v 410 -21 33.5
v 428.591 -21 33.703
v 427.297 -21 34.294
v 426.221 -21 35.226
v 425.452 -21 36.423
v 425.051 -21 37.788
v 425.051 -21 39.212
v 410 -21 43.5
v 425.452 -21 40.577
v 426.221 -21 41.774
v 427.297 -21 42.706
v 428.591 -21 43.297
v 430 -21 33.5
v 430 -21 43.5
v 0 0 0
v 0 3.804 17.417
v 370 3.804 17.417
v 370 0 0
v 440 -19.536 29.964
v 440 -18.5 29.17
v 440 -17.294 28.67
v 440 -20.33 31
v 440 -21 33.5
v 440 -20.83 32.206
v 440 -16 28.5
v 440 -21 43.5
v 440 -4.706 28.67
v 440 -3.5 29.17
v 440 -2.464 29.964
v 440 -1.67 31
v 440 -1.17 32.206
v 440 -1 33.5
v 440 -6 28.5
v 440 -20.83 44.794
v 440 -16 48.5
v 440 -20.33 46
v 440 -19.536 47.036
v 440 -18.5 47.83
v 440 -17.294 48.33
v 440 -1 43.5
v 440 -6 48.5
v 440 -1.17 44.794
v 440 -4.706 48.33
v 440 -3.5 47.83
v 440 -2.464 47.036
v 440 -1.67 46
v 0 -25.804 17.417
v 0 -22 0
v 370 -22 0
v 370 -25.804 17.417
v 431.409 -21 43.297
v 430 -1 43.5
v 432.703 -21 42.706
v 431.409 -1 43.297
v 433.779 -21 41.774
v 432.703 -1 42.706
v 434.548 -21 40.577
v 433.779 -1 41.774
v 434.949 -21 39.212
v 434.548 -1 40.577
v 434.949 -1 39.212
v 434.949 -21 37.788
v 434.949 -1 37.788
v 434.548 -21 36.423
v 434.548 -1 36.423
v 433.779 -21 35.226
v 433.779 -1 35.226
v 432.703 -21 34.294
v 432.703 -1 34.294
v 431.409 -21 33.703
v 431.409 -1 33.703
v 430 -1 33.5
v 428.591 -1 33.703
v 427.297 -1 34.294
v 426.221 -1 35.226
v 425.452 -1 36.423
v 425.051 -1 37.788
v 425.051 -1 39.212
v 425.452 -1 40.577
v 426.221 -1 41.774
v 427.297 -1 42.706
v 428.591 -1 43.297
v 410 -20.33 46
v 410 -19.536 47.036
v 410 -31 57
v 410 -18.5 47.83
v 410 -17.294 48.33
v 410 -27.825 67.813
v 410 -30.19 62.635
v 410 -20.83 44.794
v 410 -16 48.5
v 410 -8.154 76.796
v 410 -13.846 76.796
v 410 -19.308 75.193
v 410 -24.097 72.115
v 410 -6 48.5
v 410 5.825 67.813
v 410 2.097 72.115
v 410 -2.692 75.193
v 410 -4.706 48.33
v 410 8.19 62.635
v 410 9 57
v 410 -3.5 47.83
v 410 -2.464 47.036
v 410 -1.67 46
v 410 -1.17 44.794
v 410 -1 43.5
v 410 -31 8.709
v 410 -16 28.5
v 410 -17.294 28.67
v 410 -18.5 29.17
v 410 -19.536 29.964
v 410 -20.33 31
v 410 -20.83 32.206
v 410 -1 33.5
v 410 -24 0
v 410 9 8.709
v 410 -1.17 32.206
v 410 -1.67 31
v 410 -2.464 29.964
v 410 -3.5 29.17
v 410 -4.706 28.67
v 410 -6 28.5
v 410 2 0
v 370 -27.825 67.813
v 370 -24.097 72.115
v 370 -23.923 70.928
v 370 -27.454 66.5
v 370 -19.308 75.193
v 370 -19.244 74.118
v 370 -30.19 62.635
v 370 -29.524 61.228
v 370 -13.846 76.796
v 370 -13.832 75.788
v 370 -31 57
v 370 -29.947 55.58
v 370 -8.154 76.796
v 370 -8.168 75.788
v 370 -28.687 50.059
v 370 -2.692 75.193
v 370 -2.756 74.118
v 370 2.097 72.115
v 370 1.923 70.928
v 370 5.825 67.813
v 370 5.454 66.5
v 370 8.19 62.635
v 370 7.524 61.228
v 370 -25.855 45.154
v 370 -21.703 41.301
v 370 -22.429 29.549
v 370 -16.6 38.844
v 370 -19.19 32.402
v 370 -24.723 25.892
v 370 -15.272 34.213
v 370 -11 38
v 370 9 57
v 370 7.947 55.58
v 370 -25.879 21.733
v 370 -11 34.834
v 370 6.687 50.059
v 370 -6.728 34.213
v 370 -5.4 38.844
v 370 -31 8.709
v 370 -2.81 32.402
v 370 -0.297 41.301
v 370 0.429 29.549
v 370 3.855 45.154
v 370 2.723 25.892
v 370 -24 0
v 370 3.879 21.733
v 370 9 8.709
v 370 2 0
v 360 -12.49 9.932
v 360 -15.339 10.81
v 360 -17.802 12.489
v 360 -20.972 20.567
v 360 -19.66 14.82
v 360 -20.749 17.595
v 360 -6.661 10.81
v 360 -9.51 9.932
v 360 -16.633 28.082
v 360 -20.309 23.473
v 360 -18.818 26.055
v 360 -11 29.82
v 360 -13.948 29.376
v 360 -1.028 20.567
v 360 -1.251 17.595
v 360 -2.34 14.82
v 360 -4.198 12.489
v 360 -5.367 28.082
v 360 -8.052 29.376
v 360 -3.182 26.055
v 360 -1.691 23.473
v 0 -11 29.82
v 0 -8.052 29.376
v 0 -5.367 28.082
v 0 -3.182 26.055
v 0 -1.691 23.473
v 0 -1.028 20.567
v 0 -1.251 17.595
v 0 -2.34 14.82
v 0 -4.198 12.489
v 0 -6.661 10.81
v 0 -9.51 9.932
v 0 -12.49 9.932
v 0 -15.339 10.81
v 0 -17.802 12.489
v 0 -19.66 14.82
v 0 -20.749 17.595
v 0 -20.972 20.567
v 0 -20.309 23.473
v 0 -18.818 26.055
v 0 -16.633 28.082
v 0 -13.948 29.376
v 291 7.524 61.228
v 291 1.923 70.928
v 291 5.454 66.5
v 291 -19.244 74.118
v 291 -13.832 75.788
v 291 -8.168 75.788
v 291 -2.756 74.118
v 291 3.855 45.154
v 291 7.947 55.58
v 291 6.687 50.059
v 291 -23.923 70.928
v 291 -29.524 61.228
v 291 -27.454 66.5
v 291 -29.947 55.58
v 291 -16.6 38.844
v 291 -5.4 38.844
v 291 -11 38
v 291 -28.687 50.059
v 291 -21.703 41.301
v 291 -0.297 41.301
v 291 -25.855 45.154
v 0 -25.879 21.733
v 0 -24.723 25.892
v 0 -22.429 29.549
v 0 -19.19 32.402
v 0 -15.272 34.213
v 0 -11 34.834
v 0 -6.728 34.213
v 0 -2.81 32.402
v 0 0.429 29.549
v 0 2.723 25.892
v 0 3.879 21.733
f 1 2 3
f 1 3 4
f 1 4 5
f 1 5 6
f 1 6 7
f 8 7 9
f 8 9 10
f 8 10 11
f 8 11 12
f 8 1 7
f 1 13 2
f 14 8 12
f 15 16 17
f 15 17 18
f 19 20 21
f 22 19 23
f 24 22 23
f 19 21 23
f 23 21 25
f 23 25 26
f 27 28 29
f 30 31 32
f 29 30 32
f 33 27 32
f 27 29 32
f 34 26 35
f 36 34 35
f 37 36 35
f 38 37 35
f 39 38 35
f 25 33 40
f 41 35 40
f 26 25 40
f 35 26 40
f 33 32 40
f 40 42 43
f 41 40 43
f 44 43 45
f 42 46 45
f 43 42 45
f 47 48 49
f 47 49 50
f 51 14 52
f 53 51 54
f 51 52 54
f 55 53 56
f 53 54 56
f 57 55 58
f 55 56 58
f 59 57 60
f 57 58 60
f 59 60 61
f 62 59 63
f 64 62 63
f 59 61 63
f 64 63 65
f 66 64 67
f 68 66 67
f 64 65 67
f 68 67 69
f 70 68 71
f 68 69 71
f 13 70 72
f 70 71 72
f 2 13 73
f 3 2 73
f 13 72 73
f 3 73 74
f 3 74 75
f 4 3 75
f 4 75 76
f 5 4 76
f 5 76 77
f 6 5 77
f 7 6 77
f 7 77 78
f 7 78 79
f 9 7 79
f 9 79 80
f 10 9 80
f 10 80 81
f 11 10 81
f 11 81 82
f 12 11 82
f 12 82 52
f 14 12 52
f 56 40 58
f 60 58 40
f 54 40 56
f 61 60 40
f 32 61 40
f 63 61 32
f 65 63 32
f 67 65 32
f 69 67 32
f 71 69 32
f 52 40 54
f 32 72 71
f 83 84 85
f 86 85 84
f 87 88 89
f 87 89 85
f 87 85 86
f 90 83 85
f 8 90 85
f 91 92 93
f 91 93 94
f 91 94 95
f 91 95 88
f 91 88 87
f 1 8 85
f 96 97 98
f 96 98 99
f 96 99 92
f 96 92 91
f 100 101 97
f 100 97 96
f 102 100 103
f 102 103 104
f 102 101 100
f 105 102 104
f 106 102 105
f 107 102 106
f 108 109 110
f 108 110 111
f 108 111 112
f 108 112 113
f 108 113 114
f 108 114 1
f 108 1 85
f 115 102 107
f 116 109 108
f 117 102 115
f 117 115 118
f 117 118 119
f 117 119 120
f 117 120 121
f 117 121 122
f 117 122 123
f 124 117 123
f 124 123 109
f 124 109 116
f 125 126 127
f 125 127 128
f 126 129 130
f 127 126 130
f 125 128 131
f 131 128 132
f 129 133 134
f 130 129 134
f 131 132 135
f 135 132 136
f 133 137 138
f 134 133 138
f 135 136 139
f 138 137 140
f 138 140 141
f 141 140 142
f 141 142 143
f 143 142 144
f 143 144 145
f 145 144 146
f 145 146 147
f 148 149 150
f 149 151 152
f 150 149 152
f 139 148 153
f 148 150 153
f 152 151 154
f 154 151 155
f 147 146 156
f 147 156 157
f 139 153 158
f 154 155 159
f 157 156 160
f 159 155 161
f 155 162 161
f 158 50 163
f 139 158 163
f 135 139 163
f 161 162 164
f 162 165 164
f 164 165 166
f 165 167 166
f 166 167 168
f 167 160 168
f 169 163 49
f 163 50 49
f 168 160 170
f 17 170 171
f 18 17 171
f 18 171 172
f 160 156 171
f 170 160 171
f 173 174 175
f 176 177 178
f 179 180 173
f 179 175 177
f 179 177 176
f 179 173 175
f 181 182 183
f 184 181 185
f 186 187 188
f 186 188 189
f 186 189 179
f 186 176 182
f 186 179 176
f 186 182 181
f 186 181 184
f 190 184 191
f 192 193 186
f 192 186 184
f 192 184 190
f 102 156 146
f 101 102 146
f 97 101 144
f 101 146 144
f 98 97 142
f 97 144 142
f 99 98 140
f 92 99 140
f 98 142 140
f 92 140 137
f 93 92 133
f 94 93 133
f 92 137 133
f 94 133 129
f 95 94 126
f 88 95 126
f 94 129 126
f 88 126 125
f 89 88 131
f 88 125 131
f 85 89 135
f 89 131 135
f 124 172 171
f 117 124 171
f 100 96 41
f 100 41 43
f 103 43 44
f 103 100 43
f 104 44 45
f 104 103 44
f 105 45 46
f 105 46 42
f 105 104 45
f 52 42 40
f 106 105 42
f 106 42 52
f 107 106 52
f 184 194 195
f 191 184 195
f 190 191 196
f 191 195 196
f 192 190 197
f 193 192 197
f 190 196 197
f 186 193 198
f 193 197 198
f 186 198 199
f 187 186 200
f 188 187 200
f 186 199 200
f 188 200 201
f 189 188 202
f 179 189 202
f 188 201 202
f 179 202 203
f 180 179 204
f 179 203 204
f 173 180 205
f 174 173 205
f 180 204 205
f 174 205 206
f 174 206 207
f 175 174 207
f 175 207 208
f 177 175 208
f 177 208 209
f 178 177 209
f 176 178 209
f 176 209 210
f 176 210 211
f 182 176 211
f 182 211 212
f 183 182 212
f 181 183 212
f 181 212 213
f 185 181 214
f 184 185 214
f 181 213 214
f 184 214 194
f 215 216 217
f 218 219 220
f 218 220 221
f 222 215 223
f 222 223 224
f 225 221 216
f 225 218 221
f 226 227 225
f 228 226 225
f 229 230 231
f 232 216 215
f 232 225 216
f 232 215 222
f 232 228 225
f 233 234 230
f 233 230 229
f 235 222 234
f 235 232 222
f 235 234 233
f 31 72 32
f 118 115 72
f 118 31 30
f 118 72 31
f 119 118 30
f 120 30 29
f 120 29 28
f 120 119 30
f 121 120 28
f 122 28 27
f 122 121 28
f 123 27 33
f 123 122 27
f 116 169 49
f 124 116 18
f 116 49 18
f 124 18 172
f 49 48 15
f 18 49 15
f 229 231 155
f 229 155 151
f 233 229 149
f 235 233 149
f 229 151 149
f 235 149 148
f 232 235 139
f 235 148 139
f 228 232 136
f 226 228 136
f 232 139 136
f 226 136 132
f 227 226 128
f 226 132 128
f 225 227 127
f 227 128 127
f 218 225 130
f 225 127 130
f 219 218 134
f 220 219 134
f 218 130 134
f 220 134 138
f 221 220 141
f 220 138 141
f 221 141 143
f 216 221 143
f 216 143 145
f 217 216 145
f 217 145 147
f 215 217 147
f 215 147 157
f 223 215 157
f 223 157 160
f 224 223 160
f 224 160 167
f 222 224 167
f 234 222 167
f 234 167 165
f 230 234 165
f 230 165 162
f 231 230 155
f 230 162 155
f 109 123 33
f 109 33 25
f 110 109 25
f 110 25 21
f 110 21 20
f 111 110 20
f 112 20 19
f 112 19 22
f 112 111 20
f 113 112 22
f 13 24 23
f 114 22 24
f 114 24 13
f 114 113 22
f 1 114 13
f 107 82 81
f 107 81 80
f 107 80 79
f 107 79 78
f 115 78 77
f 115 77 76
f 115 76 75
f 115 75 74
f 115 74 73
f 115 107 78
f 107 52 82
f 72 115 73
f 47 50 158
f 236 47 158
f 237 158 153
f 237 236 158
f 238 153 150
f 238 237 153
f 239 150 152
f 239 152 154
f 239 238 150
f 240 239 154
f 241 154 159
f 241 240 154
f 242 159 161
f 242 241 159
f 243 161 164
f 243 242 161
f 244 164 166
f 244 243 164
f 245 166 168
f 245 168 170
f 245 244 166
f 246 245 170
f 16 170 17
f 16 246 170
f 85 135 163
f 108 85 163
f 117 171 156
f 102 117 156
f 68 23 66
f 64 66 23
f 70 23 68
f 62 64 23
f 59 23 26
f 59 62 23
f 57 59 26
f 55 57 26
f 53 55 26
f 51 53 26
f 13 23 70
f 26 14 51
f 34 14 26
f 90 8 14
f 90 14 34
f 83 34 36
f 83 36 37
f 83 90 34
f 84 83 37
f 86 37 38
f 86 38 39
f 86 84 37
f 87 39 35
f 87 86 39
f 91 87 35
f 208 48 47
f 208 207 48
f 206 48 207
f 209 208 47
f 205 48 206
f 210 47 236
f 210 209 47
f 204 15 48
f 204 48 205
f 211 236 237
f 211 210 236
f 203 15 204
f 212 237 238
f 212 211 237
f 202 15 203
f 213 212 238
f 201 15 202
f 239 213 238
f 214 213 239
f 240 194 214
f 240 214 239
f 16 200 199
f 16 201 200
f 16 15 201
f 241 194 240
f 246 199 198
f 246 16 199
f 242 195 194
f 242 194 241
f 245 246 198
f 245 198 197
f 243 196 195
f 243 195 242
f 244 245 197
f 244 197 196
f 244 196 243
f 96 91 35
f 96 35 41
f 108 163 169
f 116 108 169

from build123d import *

# Parameters (mm, degrees)
SALIENTE_EXTRUIR2_DEPTH = 370
CROQUIS3_R              = 10
CORTAR_EXTRUIR1_DEPTH   = 360
SALIENTE_EXTRUIR3_DEPTH = 40
SALIENTE_EXTRUIR4_DEPTH = 30
CORTAR_EXTRUIR2_REACH   = 449.693
CROQUIS6_R              = 5
CROQUIS7_R              = 19
SALIENTE_EXTRUIR5_DEPTH = 79


with BuildPart() as part:
    # Croquis2 → Saliente-Extruir2 (new body)
    with BuildSketch(Plane(origin=(0, 0, 0), x_dir=(0, 0, -1), z_dir=(1, 0, 0))):
        with BuildLine():
            Line((0, 0), (0, -22))
            Line((0, -22), (-17.417233251, -25.803951615))
            ThreePointArc((-17.417233251, -25.803951615), (-34.834466503, -11), (-17.417233251, 3.803951615))
            Line((-17.417233251, 3.803951615), (0, 0))
        make_face()
    extrude(amount=SALIENTE_EXTRUIR2_DEPTH)

    # Croquis3 → Cortar-Extruir1 (cut)
    with BuildSketch(Plane.ZY):
        with Locations((19.82, -11)):
            Circle(CROQUIS3_R)
    extrude(amount=-CORTAR_EXTRUIR1_DEPTH, mode=Mode.SUBTRACT)

    # Croquis4 → Saliente-Extruir3 (add)
    with BuildSketch(Plane(origin=(370, 0, 0), x_dir=(0, 0, -1), z_dir=(1, 0, 0))):
        with BuildLine():
            Line((0, -11), (0, 2))
            Line((0, 2), (-8.708616626, 9))
            Line((-8.708616626, 9), (-57, 9))
            ThreePointArc((-57, 9), (-77, -11), (-57, -31))
            Line((-57, -31), (-8.708616626, -31))
            Line((-8.708616626, -31), (0, -24))
            Line((0, -24), (0, -11))
        make_face()
    extrude(amount=SALIENTE_EXTRUIR3_DEPTH)

    # Croquis5 → Saliente-Extruir4 (add)
    with BuildSketch(Plane(origin=(410, 0, 0), x_dir=(0, 0, -1), z_dir=(1, 0, 0))):
        with BuildLine():
            Line((-43.5, -1), (-33.5, -1))
            ThreePointArc((-33.5, -1), (-29.964466094, -2.464466094), (-28.5, -6))
            Line((-28.5, -6), (-28.5, -16))
            ThreePointArc((-28.5, -16), (-29.964466094, -19.535533906), (-33.5, -21))
            Line((-33.5, -21), (-43.5, -21))
            ThreePointArc((-43.5, -21), (-47.035533906, -19.535533906), (-48.5, -16))
            Line((-48.5, -16), (-48.5, -6))
            ThreePointArc((-48.5, -6), (-47.035533906, -2.464466094), (-43.5, -1))
        make_face()
    extrude(amount=SALIENTE_EXTRUIR4_DEPTH)

    # Croquis6 → Cortar-Extruir2 (cut, up to next)
    with BuildSketch(Plane(origin=(0, -1, 0), x_dir=(1, 0, 0), z_dir=(0, 1, 0)), mode=Mode.PRIVATE) as cortar_extruir2_sk1:
        with Locations(Location((430, -38.5, 0), (0, 0, 270))):
            Circle(CROQUIS6_R)
    cortar_extruir2_tool1 = extrude(cortar_extruir2_sk1.sketch, amount=-CORTAR_EXTRUIR2_REACH, mode=Mode.PRIVATE) & part.part
    add(cortar_extruir2_tool1.solids().sort_by_distance((430, -1, 38.5))[0], mode=Mode.SUBTRACT)

    # Croquis7 → Saliente-Extruir5 (add)
    with BuildSketch(Plane.ZY.offset(-370)):
        with Locations(Location((57, -11, 0), (0, 0, 180))):
            Circle(CROQUIS7_R)
    extrude(amount=SALIENTE_EXTRUIR5_DEPTH)


solid = part.part
